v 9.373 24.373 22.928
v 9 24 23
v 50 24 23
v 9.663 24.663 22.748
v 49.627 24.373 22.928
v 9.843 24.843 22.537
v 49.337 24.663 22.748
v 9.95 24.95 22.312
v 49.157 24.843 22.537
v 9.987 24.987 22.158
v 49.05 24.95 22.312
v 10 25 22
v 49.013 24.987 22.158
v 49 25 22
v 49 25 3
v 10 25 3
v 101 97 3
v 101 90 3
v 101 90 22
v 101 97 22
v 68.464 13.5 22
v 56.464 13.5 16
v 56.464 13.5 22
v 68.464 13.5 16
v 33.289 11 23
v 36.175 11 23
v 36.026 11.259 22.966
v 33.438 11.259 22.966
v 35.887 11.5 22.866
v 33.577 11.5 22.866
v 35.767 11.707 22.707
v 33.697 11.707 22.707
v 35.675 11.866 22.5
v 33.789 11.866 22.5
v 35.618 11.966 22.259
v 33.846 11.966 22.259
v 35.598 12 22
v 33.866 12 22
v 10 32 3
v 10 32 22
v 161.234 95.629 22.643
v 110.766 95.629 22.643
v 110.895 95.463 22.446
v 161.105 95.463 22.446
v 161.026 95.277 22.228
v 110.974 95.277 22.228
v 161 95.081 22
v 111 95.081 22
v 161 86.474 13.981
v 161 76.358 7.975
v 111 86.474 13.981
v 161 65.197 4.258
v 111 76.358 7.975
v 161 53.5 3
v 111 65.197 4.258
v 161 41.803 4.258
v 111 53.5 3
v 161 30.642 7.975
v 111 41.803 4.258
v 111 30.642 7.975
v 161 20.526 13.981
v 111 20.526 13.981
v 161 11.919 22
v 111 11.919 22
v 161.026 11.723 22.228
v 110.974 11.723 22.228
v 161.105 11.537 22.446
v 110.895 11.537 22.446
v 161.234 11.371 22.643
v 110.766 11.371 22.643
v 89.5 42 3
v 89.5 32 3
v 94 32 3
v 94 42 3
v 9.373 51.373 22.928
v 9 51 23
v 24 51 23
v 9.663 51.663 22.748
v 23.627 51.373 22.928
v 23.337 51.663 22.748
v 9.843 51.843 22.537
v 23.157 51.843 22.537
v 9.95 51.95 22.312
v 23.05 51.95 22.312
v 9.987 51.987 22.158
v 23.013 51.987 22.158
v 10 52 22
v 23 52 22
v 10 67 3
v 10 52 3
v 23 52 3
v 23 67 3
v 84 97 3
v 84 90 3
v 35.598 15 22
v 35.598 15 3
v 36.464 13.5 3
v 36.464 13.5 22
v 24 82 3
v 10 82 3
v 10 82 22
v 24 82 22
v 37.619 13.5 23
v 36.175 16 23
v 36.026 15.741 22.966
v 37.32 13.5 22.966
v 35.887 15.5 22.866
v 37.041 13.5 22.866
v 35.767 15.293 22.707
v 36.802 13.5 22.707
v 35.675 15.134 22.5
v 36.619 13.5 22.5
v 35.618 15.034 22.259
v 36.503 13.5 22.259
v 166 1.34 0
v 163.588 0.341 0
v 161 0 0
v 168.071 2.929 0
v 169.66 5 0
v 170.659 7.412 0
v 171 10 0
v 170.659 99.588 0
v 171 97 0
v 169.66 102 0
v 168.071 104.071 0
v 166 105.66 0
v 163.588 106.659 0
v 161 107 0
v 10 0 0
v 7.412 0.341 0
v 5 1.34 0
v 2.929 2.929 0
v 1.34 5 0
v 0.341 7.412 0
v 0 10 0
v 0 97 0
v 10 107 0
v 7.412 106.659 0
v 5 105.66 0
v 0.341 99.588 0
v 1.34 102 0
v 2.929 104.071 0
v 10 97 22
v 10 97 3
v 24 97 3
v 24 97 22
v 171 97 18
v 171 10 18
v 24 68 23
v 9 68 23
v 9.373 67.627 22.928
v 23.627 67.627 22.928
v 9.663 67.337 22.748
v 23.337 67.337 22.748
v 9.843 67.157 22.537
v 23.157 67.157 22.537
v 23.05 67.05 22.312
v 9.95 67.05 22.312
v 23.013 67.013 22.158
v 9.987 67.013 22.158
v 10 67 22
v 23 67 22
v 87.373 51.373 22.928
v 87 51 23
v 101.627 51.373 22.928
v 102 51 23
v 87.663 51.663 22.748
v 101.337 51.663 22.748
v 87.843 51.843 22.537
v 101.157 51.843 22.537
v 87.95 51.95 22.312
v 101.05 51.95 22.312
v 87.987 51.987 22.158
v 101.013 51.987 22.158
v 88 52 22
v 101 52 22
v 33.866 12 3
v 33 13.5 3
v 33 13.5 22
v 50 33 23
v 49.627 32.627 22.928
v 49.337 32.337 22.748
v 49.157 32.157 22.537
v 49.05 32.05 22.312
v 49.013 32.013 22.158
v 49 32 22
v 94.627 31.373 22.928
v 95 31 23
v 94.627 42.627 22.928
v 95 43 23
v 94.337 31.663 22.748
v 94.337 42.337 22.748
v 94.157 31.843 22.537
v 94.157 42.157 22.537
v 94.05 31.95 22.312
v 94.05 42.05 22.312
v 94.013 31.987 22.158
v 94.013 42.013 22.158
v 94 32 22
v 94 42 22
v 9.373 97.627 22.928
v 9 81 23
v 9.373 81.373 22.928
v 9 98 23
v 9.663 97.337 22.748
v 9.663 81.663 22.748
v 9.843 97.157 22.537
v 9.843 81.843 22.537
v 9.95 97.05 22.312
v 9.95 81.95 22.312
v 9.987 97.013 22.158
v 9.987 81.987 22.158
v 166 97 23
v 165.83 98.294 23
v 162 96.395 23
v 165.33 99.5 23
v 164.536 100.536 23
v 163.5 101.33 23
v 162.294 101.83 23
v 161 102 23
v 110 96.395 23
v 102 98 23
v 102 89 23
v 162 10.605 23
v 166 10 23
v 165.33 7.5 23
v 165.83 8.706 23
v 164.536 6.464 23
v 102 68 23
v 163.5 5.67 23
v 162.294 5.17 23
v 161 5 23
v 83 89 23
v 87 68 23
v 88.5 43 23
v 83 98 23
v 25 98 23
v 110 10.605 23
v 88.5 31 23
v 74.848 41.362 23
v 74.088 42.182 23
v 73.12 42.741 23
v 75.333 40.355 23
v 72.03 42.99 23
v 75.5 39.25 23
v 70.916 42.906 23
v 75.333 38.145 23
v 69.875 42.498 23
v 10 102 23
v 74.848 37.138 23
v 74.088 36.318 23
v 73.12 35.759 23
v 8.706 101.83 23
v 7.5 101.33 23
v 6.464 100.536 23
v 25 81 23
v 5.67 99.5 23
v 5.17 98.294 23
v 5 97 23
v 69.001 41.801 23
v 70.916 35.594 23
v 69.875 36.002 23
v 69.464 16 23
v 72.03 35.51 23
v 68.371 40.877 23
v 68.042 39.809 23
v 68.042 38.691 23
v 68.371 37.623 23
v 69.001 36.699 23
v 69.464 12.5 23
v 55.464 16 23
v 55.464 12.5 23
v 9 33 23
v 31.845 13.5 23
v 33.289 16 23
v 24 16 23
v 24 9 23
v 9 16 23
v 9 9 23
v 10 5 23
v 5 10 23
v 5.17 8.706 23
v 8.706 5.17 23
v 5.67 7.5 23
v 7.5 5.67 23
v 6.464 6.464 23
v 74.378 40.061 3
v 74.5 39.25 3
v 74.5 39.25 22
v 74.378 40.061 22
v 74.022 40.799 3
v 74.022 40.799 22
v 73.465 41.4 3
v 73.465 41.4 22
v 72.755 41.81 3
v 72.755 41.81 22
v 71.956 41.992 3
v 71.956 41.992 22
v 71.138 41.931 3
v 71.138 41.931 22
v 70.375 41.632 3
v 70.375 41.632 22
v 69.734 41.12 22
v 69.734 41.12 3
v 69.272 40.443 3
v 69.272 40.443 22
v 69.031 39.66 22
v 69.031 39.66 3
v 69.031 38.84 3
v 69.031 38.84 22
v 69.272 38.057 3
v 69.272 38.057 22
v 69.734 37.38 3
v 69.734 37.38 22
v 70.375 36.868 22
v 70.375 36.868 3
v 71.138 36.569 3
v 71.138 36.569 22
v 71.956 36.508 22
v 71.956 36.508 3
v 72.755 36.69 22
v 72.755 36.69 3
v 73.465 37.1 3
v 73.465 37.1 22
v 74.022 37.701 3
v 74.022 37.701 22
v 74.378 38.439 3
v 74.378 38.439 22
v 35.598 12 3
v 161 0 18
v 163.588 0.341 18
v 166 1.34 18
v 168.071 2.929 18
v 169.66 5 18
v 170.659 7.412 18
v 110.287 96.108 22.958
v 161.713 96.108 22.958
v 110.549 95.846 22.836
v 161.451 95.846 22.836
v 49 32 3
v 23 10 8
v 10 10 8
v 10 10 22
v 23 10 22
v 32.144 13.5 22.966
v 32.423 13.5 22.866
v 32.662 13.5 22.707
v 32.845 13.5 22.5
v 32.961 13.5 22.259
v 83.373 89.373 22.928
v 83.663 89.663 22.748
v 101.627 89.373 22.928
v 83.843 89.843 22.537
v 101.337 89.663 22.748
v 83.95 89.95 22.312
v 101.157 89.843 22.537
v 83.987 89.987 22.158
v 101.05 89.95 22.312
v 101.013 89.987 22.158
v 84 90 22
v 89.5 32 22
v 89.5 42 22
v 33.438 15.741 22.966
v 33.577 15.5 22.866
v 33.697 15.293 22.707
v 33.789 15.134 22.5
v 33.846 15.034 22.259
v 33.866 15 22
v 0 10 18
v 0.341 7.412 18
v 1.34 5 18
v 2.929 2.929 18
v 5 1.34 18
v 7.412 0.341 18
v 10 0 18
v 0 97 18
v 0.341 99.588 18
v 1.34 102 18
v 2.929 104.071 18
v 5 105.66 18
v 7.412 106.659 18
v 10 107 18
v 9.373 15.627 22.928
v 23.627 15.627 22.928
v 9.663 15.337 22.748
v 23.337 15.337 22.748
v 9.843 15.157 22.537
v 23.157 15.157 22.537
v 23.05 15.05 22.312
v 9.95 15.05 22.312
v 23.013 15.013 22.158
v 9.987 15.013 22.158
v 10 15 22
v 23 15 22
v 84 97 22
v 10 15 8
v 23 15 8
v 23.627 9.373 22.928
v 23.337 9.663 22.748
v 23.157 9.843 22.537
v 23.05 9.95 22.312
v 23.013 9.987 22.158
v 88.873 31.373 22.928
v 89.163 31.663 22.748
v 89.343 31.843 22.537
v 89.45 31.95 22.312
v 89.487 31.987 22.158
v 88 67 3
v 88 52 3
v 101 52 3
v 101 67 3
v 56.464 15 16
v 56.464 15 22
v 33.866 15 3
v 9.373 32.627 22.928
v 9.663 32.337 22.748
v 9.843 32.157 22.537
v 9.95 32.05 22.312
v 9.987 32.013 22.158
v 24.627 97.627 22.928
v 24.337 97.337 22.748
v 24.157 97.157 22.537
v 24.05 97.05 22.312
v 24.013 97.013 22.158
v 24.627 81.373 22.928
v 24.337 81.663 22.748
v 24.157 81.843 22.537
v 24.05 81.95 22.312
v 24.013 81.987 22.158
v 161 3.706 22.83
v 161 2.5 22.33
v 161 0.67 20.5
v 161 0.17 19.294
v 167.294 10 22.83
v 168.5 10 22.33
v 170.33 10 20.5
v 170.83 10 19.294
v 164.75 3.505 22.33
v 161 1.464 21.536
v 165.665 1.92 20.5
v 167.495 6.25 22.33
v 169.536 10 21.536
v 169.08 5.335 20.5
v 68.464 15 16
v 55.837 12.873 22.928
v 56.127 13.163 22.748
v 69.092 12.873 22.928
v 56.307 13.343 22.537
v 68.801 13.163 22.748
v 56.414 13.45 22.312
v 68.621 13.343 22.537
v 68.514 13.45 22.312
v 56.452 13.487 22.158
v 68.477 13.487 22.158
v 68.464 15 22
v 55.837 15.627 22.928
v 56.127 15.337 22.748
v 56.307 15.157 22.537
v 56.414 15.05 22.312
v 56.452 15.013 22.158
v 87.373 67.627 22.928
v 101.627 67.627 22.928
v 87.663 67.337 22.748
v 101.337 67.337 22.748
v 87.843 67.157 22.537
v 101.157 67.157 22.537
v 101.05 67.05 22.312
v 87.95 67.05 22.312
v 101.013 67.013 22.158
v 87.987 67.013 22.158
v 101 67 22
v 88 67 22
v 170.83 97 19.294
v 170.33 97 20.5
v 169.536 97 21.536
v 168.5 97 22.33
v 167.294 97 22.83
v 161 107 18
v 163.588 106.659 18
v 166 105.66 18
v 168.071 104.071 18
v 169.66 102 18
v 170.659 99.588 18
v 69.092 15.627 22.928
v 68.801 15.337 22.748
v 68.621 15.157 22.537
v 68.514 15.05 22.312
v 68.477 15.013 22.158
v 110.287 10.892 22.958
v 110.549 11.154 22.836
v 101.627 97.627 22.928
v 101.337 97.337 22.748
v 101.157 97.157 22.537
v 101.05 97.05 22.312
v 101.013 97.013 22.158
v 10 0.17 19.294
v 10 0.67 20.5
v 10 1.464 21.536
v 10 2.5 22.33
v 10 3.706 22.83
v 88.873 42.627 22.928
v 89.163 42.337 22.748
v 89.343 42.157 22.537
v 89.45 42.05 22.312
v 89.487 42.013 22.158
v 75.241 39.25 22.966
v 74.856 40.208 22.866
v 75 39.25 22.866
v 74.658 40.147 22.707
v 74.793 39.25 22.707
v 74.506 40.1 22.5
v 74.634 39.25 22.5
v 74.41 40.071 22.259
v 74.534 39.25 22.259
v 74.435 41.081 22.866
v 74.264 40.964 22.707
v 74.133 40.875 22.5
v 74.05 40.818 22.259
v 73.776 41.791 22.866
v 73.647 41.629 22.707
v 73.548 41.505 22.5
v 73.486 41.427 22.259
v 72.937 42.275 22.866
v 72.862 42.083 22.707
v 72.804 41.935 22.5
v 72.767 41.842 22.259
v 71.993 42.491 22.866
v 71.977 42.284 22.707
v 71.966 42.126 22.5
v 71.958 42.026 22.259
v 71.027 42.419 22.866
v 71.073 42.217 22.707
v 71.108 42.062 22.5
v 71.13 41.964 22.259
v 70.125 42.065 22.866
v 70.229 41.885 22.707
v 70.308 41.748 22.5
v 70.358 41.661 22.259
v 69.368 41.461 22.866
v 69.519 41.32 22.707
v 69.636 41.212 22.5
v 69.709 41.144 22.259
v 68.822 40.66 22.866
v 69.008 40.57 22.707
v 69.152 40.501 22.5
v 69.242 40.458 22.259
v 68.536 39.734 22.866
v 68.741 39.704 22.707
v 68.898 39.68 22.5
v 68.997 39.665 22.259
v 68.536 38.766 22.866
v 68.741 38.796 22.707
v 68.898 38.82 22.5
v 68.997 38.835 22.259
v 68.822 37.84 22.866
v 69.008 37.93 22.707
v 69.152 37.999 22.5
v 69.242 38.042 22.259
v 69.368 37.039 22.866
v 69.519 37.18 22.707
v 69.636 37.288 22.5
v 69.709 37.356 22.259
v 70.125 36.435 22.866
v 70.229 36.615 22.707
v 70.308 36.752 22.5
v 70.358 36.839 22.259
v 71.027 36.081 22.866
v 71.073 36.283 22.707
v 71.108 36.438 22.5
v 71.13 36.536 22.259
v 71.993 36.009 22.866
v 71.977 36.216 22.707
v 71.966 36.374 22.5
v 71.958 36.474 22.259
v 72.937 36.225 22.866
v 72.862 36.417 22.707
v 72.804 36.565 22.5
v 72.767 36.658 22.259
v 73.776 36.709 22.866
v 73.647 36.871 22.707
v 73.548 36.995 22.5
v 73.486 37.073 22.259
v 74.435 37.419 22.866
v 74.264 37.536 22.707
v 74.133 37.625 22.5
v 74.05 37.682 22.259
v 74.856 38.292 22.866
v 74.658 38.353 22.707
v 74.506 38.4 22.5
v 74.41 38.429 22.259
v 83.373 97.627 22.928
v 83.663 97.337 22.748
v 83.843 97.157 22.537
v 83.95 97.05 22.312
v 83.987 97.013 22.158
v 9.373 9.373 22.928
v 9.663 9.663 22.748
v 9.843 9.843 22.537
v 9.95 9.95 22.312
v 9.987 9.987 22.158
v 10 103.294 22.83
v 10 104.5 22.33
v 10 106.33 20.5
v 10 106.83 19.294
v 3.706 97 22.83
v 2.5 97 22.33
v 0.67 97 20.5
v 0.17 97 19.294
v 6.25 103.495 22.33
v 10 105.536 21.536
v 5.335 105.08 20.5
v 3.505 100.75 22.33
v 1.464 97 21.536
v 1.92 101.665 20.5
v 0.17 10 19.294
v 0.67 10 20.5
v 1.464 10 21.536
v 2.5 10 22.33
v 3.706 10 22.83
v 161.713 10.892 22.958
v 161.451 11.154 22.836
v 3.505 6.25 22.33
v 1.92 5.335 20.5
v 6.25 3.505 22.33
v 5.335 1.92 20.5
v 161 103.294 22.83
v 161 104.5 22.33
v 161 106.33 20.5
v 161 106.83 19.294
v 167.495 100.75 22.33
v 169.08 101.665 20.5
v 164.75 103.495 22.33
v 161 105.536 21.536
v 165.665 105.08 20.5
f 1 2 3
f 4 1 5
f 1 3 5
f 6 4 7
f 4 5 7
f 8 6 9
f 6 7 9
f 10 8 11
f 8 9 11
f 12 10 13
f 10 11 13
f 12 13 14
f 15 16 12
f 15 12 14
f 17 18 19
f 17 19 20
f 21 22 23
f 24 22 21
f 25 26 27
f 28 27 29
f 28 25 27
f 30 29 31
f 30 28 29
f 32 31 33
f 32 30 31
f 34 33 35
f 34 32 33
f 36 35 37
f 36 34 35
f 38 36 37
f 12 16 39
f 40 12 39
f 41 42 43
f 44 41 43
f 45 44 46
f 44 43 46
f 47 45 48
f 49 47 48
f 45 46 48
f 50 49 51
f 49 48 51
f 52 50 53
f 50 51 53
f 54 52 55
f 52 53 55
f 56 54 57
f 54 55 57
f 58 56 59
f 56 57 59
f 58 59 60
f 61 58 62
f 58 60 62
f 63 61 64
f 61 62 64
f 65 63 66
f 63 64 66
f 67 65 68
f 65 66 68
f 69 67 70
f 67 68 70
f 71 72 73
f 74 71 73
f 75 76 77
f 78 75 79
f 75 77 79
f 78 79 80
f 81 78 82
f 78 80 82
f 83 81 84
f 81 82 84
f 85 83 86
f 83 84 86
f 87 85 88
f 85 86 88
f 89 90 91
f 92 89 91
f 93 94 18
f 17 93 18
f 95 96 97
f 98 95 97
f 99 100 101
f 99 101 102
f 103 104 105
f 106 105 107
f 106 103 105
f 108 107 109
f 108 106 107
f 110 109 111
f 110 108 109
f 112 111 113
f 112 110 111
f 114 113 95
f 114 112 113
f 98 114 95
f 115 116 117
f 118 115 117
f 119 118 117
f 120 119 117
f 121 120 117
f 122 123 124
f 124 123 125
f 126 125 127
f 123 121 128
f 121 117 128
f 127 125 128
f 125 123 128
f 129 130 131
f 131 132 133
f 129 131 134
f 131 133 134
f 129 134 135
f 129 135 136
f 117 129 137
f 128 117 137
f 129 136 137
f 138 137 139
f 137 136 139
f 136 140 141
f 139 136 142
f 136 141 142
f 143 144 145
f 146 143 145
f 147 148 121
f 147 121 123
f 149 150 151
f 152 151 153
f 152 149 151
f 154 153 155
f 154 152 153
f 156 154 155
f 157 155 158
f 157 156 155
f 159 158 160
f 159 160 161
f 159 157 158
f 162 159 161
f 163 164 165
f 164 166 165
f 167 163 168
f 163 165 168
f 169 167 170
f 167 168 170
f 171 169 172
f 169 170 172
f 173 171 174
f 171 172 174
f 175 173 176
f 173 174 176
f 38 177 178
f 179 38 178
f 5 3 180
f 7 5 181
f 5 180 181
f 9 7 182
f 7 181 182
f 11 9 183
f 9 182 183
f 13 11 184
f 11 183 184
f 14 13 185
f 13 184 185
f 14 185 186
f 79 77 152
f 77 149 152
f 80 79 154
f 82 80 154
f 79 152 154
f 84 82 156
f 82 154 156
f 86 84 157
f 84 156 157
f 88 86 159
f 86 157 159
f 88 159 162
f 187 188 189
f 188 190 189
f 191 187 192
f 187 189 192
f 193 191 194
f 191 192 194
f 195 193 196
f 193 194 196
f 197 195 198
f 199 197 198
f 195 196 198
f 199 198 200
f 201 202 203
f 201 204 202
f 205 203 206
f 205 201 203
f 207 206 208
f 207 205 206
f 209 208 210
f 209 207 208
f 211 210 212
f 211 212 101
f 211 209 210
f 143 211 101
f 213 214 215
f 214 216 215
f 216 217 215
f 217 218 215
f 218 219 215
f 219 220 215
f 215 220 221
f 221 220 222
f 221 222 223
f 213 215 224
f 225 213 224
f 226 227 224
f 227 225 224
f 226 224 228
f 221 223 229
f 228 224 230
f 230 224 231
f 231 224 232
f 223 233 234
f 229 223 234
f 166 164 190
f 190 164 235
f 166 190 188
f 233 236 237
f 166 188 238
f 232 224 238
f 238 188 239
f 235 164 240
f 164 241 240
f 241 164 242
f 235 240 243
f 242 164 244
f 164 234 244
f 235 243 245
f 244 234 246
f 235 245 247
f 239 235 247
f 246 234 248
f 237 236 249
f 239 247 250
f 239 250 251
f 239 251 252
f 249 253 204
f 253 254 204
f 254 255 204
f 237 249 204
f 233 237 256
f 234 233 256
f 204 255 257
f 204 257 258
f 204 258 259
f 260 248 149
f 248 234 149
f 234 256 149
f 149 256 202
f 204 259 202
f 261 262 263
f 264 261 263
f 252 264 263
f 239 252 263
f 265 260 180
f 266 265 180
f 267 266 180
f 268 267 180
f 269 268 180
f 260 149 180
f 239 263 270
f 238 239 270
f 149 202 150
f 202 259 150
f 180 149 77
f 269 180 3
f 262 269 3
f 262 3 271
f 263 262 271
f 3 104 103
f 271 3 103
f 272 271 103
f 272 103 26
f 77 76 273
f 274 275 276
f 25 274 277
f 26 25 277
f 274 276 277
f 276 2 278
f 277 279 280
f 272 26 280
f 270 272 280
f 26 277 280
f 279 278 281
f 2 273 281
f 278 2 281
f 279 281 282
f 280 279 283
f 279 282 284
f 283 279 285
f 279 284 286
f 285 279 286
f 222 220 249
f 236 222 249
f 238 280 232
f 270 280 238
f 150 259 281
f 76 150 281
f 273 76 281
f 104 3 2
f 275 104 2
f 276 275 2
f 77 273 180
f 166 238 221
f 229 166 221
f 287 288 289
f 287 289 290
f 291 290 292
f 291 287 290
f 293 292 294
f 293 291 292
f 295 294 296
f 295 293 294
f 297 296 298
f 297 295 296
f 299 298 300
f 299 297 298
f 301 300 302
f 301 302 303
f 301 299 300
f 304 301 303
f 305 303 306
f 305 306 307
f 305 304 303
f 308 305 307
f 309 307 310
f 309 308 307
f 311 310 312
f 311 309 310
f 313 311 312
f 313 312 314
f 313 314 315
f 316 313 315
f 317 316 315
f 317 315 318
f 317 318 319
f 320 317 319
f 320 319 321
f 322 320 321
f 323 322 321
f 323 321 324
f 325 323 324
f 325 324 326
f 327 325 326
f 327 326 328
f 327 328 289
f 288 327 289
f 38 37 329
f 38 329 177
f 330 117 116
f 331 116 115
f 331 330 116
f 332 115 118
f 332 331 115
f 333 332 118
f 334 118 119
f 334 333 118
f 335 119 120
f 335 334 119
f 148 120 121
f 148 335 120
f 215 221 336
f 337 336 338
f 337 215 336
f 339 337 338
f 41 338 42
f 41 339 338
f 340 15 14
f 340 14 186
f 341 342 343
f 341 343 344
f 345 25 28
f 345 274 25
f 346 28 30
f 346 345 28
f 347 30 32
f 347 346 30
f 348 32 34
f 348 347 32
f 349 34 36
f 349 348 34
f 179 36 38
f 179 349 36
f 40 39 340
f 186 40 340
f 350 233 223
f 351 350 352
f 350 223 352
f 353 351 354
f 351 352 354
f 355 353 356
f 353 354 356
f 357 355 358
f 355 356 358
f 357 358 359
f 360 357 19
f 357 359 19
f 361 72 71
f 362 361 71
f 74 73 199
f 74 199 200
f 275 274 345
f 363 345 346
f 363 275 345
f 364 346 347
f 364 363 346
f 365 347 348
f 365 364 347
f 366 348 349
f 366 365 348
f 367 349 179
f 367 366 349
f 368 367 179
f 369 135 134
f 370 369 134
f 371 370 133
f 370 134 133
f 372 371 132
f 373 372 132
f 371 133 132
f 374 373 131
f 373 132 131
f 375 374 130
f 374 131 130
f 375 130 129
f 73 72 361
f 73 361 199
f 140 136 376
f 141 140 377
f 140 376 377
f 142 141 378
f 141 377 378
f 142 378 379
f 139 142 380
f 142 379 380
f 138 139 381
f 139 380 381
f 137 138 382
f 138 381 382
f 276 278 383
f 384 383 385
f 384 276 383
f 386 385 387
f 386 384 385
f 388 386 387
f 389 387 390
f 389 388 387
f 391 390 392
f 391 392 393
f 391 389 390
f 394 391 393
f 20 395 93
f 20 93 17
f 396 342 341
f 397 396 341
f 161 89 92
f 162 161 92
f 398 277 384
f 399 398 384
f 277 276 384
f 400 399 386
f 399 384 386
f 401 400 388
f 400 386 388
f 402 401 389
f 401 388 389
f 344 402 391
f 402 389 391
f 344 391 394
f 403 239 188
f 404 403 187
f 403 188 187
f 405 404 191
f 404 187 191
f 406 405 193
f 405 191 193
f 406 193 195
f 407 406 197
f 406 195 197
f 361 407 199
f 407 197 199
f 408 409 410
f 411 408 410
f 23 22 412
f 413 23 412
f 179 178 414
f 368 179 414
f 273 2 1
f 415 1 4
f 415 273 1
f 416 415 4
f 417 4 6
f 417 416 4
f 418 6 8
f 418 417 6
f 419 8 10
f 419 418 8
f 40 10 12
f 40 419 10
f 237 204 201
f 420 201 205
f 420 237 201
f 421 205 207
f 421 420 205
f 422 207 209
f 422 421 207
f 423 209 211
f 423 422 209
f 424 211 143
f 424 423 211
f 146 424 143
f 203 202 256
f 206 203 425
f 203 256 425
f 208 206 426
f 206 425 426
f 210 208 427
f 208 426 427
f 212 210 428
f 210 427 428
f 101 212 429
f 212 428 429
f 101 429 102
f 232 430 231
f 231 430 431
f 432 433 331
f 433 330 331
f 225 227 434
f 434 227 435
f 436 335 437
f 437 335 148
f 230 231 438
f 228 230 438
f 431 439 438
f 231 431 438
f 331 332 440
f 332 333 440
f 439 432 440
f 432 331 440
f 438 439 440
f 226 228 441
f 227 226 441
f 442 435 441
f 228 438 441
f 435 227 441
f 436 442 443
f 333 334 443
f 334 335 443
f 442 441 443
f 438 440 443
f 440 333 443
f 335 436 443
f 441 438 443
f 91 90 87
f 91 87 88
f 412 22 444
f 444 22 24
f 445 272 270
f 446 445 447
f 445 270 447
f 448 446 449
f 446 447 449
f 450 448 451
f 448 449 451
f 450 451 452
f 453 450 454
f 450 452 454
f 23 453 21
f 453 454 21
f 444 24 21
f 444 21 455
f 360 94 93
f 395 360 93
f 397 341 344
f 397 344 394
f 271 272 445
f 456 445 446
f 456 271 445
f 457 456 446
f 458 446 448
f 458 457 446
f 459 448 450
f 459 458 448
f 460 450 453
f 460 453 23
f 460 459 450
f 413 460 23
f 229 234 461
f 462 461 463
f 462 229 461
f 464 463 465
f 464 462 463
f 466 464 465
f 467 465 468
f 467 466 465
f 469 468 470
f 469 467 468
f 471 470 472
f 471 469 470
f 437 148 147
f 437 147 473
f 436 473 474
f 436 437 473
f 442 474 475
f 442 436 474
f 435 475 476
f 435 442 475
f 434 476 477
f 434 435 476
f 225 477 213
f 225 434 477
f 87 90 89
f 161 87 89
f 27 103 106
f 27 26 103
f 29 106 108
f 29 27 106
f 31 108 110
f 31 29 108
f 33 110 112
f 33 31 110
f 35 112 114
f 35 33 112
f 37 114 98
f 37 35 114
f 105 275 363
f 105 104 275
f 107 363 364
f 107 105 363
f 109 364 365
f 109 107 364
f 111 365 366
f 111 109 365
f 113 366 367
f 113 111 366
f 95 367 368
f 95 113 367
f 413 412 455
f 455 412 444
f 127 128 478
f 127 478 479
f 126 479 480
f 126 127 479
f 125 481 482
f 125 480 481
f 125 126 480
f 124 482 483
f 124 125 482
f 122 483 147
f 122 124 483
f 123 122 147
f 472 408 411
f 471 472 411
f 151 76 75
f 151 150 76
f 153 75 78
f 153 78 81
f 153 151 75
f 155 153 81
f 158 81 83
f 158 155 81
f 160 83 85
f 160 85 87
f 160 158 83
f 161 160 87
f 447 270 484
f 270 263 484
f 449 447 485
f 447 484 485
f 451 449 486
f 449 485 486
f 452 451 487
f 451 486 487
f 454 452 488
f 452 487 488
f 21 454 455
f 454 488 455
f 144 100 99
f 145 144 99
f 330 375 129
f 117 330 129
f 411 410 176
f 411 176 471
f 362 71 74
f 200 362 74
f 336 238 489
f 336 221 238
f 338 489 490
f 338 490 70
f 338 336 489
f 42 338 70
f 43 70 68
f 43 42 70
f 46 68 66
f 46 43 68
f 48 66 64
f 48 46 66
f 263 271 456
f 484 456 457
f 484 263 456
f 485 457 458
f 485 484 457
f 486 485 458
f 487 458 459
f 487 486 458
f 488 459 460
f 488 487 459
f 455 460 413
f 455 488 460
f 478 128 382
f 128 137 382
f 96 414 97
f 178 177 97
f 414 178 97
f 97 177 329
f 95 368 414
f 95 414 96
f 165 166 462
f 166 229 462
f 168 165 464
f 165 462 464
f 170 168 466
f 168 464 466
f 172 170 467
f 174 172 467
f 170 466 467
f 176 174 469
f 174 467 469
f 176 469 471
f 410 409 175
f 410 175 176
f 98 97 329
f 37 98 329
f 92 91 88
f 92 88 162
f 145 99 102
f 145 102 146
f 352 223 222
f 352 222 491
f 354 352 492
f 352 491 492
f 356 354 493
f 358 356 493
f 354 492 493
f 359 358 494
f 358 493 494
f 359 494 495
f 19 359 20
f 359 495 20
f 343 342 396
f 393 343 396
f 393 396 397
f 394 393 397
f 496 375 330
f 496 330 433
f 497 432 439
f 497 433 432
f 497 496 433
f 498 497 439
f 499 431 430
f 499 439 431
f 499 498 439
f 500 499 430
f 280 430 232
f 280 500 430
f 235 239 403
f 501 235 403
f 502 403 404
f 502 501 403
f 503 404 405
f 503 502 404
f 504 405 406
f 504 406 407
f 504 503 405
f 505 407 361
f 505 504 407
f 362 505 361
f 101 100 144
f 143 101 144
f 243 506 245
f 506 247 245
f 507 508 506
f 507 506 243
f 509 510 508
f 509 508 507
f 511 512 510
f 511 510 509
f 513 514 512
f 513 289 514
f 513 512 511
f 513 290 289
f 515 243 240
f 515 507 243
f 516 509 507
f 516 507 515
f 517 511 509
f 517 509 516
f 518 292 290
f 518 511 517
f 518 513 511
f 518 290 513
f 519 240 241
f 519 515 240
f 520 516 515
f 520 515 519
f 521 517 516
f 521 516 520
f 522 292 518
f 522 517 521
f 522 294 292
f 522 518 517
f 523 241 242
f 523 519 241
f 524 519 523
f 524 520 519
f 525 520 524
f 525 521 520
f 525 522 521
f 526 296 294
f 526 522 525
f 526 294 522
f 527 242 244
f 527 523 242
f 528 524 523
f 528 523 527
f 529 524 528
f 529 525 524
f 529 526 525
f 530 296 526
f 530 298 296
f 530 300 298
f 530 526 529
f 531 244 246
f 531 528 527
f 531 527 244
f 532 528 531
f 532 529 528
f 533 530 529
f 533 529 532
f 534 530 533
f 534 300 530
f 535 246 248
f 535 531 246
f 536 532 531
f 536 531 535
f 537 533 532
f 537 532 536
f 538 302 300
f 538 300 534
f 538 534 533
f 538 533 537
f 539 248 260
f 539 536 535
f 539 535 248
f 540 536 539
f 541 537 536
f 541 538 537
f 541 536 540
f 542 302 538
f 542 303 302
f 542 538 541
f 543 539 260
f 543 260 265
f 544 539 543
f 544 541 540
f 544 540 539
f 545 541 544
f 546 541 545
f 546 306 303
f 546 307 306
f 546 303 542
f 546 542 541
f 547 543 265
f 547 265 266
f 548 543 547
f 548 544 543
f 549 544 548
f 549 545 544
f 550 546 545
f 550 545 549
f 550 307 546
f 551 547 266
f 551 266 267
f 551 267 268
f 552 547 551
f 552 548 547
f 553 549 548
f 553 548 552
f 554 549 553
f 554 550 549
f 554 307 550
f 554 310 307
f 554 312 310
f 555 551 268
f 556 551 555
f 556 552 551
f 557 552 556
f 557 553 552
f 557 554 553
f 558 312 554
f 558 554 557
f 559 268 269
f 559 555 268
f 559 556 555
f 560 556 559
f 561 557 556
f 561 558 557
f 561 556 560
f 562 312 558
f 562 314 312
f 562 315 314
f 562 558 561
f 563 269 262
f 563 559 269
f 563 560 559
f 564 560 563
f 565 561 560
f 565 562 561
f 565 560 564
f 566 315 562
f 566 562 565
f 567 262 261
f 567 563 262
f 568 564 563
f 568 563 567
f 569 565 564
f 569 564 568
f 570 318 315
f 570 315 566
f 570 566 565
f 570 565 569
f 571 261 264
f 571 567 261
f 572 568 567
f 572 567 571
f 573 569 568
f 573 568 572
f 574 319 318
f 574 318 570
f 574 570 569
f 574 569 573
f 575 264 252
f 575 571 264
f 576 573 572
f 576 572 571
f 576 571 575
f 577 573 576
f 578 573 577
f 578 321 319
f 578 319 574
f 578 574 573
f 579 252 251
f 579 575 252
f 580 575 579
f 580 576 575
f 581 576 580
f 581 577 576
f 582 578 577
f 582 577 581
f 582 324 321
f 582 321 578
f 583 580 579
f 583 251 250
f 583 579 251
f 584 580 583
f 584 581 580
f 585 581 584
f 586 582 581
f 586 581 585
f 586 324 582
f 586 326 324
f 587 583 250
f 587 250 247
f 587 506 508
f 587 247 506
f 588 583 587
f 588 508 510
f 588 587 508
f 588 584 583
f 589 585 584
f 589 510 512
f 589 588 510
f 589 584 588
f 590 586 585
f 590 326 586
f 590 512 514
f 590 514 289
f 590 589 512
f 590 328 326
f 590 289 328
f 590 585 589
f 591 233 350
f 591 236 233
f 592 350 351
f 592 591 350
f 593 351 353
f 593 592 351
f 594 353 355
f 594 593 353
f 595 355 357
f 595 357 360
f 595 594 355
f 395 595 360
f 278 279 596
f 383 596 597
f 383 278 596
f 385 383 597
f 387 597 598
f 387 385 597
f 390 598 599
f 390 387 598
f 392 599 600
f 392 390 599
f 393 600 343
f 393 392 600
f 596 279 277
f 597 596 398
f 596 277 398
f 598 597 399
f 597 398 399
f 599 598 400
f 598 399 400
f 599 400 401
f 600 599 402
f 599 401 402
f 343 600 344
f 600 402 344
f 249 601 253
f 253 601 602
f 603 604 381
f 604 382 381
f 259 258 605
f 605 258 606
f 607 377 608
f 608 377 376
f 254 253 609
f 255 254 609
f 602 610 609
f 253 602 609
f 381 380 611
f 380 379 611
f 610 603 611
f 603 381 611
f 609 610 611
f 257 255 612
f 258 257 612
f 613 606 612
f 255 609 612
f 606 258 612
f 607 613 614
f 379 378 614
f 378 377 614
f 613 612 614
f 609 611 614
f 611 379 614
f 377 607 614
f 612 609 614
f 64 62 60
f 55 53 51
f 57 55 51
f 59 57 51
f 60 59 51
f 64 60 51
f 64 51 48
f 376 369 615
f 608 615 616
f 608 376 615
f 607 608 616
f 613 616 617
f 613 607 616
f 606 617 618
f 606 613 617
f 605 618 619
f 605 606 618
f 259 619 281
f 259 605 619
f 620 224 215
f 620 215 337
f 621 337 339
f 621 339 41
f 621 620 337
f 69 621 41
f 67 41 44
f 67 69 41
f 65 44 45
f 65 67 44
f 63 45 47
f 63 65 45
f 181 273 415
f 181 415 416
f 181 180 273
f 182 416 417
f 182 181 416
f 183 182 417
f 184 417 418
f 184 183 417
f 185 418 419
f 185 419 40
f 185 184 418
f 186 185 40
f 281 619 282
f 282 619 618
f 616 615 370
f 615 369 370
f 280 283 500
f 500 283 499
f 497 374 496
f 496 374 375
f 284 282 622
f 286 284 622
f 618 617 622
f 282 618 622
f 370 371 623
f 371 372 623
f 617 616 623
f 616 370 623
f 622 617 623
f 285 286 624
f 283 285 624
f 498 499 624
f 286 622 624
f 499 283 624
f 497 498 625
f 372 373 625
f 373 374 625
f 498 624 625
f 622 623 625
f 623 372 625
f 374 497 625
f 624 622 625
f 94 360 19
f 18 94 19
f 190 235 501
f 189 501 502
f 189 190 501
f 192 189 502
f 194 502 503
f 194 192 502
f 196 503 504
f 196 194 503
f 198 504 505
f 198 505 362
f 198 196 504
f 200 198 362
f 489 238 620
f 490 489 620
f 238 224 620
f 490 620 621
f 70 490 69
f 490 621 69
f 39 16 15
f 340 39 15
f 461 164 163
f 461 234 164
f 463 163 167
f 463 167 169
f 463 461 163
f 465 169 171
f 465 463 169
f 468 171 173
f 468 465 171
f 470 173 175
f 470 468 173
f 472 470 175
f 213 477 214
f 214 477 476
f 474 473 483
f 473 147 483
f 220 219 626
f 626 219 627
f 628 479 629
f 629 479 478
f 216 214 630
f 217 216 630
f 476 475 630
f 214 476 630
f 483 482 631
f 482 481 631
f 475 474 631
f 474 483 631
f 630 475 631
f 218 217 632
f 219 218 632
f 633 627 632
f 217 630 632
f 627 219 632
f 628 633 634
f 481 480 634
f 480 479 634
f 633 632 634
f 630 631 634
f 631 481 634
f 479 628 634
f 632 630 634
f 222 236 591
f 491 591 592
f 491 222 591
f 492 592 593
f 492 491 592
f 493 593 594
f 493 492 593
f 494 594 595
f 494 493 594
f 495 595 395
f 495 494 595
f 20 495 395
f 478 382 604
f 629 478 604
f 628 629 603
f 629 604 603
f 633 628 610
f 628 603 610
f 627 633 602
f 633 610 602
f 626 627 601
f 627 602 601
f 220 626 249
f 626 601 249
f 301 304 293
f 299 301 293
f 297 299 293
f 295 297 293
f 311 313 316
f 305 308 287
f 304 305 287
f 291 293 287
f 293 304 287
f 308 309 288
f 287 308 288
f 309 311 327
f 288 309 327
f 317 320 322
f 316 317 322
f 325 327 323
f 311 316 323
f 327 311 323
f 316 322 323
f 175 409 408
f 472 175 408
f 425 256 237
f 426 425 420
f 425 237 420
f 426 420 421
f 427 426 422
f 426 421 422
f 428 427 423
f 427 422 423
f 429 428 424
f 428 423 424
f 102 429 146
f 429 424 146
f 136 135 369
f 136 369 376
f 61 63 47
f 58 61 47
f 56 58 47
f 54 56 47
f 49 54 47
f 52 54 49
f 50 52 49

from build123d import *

# Parameters (mm, degrees)
F0_W          = 111
F0_H          = 107
F0_W_2        = 13
F0_H_2        = 5
F0_W_3        = 39
F0_H_3        = 7
F0_W_4        = 12
F0_H_4        = 1.5
F0_R          = 2.75
F0_W_5        = 4.5
F0_H_5        = 10
F0_H_6        = 15
F0_W_6        = 14
F0_W_7        = 17
F1_DEPTH      = 23
F2_W          = 111
F2_H          = 107
F3_DEPTH      = 3
F4_DEPTH      = 5
F5_DEPTH      = 13
F7_DEPTH      = 50
F9_DEPTH      = 10
F10_R         = 5
F11_T3_ANGLE  = 90
F11_T6_ANGLE  = 90
F11_T9_ANGLE  = 90
F11_T12_ANGLE = 90
F11_T15_DEPTH = 48
F11_T18_DEPTH = 48
F11_T21_DEPTH = 48
F11_T24_DEPTH = 48
F12_R         = 1


# Not quite as in the source:
# - a fillet or chamfer that OpenCascade refuses, or shapes differently, is made with other operations: its cross-section is extruded or revolved along the edge and cut away or added


with BuildPart() as f1:
    # F0 (on Top) → F1 (new body)
    with BuildSketch(Plane.XY):
        with Locations((55.5, 53.5)):
            Rectangle(F0_W, F0_H)
        with Locations((16.5, 12.5)):
            Rectangle(F0_W_2, F0_H_2, mode=Mode.SUBTRACT)
        Polygon((35.5980762114, 15), (36.4641016151, 13.5), (35.5980762114, 12), (33.8660254038, 12), (33, 13.5), (33.8660254038, 15), align=None, mode=Mode.SUBTRACT)
        with Locations((29.5, 28.5)):
            Rectangle(F0_W_3, F0_H_3, mode=Mode.SUBTRACT)
        with Locations((62.4641016151, 14.25)):
            Rectangle(F0_W_4, F0_H_4, mode=Mode.SUBTRACT)
        with Locations((71.75, 39.25)):
            Circle(F0_R, mode=Mode.SUBTRACT)
        with Locations((91.75, 37)):
            Rectangle(F0_W_5, F0_H_5, mode=Mode.SUBTRACT)
        with Locations((16.5, 59.5)):
            Rectangle(F0_W_2, F0_H_6, mode=Mode.SUBTRACT)
        with Locations((17, 89.5)):
            Rectangle(F0_W_6, F0_H_6, mode=Mode.SUBTRACT)
        with Locations((94.5, 59.5)):
            Rectangle(F0_W_2, F0_H_6, mode=Mode.SUBTRACT)
        with Locations((92.5, 93.5)):
            Rectangle(F0_W_7, F0_H_3, mode=Mode.SUBTRACT)
    extrude(amount=F1_DEPTH)

    # F2 (on face) → F3 (join)
    with BuildSketch(Plane(origin=(0, 0, 0), x_dir=(1, 0, 0), z_dir=(0, 0, -1))):
        with Locations((55.5, -53.5)):
            Rectangle(F2_W, F2_H)
    extrude(amount=-F3_DEPTH)

    # F4 (add): a face of the model
    f4_faces = [f1.faces().sort_by_distance(p)[0] for p in [
        (16.5, 12.5, 3),
    ]]
    extrude(f4_faces, amount=F4_DEPTH)

    # F5 (add): a face of the model
    f5_faces = [f1.faces().sort_by_distance(p)[0] for p in [
        (62.4641016151, 14.25, 3),
    ]]
    extrude(f5_faces, amount=F5_DEPTH)

    # F6 (on face) → F7 (join)
    with BuildSketch(Plane.YZ.offset(111)):
        with BuildLine():
            Line((11.0735931288, 23), (0, 23))
            Line((0, 23), (0, 0))
            Line((0, 0), (107, 0))
            Line((107, 0), (107, 23))
            Line((107, 23), (95.9264068712, 23))
            ThreePointArc((95.9264068712, 23), (53.5, 3), (11.0735931288, 23))
        make_face()
    extrude(amount=F7_DEPTH)

    # F8 (on face) → F9 (join)
    with BuildSketch(Plane.YZ.offset(161)):
        with BuildLine():
            Line((0, 23), (0, 0))
            Line((0, 0), (107, 0))
            Line((107, 0), (107, 23))
            Line((107, 23), (95.9264068712, 23))
            ThreePointArc((95.9264068712, 23), (53.5, 3), (11.0735931288, 23))
            Line((11.0735931288, 23), (0, 23))
        make_face()
        with BuildLine():
            Line((95.9264068712, 23), (11.0735931288, 23))
            ThreePointArc((11.0735931288, 23), (53.5, 3), (95.9264068712, 23))
        make_face()
    extrude(amount=F9_DEPTH)

    # F10
    f10_edges = [f1.edges().sort_by_distance(p)[0] for p in [
        (85.5, 107, 23),
        (171, 53.5, 23),
        (85.5, 0, 23),
        (0, 53.5, 23),
    ]]
    fillet(f10_edges, radius=F10_R)

    # F11: fillet of radius 10 on 4 edges, made by hand


with BuildPart() as f11_tool1:
    # F11_s2 → F11_t3 (revolve)
    with BuildSketch(Plane.YZ.offset(10)):
        with BuildLine():
            ThreePointArc((102, 23), (105.5355339059, 21.5355339059), (107, 18))
            Line((107, 18), (107, 23))
            Line((107, 23), (102, 23))
        make_face()
    revolve(axis=Axis((10, 97, 23), (0, 0, 1)), revolution_arc=F11_T3_ANGLE)


with BuildPart() as f11_tool4:
    # F11_s5 → F11_t6 (revolve)
    with BuildSketch(Plane.XZ.offset(-10)):
        with BuildLine():
            ThreePointArc((5, 23), (1.4644660941, 21.5355339059), (0, 18))
            Line((0, 18), (0, 23))
            Line((0, 23), (5, 23))
        make_face()
    revolve(axis=Axis((10, 10, 23), (0, 0, 1)), revolution_arc=F11_T6_ANGLE)


with BuildPart() as f11_tool7:
    # F11_s8 → F11_t9 (revolve)
    with BuildSketch(Plane.YZ.offset(161)):
        with BuildLine():
            ThreePointArc((5, 23), (1.4644660941, 21.5355339059), (0, 18))
            Line((0, 18), (0, 23))
            Line((0, 23), (5, 23))
        make_face()
    revolve(axis=Axis((161, 10, 23), (0, 0, 1)), revolution_arc=F11_T9_ANGLE)


with BuildPart() as f11_tool10:
    # F11_s11 → F11_t12 (revolve)
    with BuildSketch(Plane.XZ.offset(-97)):
        with BuildLine():
            ThreePointArc((166, 23), (169.5355339059, 21.5355339059), (171, 18))
            Line((171, 18), (171, 23))
            Line((171, 23), (166, 23))
        make_face()
    revolve(axis=Axis((161, 97, 23), (0, 0, 1)), revolution_arc=F11_T12_ANGLE)


with BuildPart() as f11_tool13:
    # F11_s14 → F11_t15 (new body)
    with BuildSketch(Plane.XY.offset(-25)):
        with BuildLine():
            ThreePointArc((161, 107), (168.0710678119, 104.0710678119), (171, 97))
            Line((171, 97), (171, 107))
            Line((171, 107), (161, 107))
        make_face()
    extrude(amount=F11_T15_DEPTH)


with BuildPart() as f11_tool16:
    # F11_s17 → F11_t18 (new body)
    with BuildSketch(Plane.XY.offset(23)):
        with BuildLine():
            ThreePointArc((161, 0), (168.0710678119, 2.9289321881), (171, 10))
            Line((171, 10), (171, 0))
            Line((171, 0), (161, 0))
        make_face()
    extrude(amount=-F11_T18_DEPTH)


with BuildPart() as f11_tool19:
    # F11_s20 → F11_t21 (new body)
    with BuildSketch(Plane.XY.offset(-25)):
        with BuildLine():
            ThreePointArc((0, 10), (2.9289321881, 2.9289321881), (10, 0))
            Line((10, 0), (0, 0))
            Line((0, 0), (0, 10))
        make_face()
    extrude(amount=F11_T21_DEPTH)


with BuildPart() as f11_tool22:
    # F11_s23 → F11_t24 (new body)
    with BuildSketch(Plane.XY.offset(23)):
        with BuildLine():
            ThreePointArc((0, 97), (2.9289321881, 104.0710678119), (10, 107))
            Line((10, 107), (0, 107))
            Line((0, 107), (0, 97))
        make_face()
    extrude(amount=-F11_T24_DEPTH)


with BuildPart() as f1_1:
    add(f1.part)

    # F11_t25: cut F11_tool1, F11_tool4, F11_tool7, F11_tool10, F11_tool13, F11_tool16, F11_tool19, F11_tool22
    add([f11_tool1.part, f11_tool4.part, f11_tool7.part, f11_tool10.part, f11_tool13.part, f11_tool16.part, f11_tool19.part, f11_tool22.part], mode=Mode.SUBTRACT)

    # F12
    f12_edges = [f1_1.edges().sort_by_distance(p)[0] for p in [
        (85.5, 102, 23),
        (164.535534, 100.535534, 23),
        (166, 53.5, 23),
        (164.535534, 6.464466, 23),
        (85.5, 5, 23),
        (6.464466, 6.464466, 23),
        (5, 53.5, 23),
        (6.464466, 100.535534, 23),
        (10, 12.5, 23),
        (16.5, 10, 23),
        (16.5, 15, 23),
        (23, 12.5, 23),
        (36.031089, 14.25, 23),
        (34.732051, 15, 23),
        (36.031089, 12.75, 23),
        (33.433013, 14.25, 23),
        (34.732051, 12, 23),
        (33.433013, 12.75, 23),
        (10, 28.5, 23),
        (29.5, 25, 23),
        (29.5, 32, 23),
        (49, 28.5, 23),
        (56.464102, 14.25, 23),
        (62.464102, 13.5, 23),
        (62.464102, 15, 23),
        (68.464102, 14.25, 23),
        (69, 39.25, 23),
        (89.5, 37, 23),
        (91.75, 32, 23),
        (91.75, 42, 23),
        (94, 37, 23),
        (136, 11.073593, 23),
        (111, 53.5, 23),
        (161, 53.5, 23),
        (136, 95.926407, 23),
        (10, 59.5, 23),
        (16.5, 52, 23),
        (16.5, 67, 23),
        (23, 59.5, 23),
        (17, 82, 23),
        (24, 89.5, 23),
        (10, 89.5, 23),
        (17, 97, 23),
        (94.5, 67, 23),
        (88, 59.5, 23),
        (101, 59.5, 23),
        (94.5, 52, 23),
        (92.5, 90, 23),
        (101, 93.5, 23),
        (84, 93.5, 23),
        (92.5, 97, 23),
    ]]
    fillet(f12_edges, radius=F12_R)


solid = f1_1.part
